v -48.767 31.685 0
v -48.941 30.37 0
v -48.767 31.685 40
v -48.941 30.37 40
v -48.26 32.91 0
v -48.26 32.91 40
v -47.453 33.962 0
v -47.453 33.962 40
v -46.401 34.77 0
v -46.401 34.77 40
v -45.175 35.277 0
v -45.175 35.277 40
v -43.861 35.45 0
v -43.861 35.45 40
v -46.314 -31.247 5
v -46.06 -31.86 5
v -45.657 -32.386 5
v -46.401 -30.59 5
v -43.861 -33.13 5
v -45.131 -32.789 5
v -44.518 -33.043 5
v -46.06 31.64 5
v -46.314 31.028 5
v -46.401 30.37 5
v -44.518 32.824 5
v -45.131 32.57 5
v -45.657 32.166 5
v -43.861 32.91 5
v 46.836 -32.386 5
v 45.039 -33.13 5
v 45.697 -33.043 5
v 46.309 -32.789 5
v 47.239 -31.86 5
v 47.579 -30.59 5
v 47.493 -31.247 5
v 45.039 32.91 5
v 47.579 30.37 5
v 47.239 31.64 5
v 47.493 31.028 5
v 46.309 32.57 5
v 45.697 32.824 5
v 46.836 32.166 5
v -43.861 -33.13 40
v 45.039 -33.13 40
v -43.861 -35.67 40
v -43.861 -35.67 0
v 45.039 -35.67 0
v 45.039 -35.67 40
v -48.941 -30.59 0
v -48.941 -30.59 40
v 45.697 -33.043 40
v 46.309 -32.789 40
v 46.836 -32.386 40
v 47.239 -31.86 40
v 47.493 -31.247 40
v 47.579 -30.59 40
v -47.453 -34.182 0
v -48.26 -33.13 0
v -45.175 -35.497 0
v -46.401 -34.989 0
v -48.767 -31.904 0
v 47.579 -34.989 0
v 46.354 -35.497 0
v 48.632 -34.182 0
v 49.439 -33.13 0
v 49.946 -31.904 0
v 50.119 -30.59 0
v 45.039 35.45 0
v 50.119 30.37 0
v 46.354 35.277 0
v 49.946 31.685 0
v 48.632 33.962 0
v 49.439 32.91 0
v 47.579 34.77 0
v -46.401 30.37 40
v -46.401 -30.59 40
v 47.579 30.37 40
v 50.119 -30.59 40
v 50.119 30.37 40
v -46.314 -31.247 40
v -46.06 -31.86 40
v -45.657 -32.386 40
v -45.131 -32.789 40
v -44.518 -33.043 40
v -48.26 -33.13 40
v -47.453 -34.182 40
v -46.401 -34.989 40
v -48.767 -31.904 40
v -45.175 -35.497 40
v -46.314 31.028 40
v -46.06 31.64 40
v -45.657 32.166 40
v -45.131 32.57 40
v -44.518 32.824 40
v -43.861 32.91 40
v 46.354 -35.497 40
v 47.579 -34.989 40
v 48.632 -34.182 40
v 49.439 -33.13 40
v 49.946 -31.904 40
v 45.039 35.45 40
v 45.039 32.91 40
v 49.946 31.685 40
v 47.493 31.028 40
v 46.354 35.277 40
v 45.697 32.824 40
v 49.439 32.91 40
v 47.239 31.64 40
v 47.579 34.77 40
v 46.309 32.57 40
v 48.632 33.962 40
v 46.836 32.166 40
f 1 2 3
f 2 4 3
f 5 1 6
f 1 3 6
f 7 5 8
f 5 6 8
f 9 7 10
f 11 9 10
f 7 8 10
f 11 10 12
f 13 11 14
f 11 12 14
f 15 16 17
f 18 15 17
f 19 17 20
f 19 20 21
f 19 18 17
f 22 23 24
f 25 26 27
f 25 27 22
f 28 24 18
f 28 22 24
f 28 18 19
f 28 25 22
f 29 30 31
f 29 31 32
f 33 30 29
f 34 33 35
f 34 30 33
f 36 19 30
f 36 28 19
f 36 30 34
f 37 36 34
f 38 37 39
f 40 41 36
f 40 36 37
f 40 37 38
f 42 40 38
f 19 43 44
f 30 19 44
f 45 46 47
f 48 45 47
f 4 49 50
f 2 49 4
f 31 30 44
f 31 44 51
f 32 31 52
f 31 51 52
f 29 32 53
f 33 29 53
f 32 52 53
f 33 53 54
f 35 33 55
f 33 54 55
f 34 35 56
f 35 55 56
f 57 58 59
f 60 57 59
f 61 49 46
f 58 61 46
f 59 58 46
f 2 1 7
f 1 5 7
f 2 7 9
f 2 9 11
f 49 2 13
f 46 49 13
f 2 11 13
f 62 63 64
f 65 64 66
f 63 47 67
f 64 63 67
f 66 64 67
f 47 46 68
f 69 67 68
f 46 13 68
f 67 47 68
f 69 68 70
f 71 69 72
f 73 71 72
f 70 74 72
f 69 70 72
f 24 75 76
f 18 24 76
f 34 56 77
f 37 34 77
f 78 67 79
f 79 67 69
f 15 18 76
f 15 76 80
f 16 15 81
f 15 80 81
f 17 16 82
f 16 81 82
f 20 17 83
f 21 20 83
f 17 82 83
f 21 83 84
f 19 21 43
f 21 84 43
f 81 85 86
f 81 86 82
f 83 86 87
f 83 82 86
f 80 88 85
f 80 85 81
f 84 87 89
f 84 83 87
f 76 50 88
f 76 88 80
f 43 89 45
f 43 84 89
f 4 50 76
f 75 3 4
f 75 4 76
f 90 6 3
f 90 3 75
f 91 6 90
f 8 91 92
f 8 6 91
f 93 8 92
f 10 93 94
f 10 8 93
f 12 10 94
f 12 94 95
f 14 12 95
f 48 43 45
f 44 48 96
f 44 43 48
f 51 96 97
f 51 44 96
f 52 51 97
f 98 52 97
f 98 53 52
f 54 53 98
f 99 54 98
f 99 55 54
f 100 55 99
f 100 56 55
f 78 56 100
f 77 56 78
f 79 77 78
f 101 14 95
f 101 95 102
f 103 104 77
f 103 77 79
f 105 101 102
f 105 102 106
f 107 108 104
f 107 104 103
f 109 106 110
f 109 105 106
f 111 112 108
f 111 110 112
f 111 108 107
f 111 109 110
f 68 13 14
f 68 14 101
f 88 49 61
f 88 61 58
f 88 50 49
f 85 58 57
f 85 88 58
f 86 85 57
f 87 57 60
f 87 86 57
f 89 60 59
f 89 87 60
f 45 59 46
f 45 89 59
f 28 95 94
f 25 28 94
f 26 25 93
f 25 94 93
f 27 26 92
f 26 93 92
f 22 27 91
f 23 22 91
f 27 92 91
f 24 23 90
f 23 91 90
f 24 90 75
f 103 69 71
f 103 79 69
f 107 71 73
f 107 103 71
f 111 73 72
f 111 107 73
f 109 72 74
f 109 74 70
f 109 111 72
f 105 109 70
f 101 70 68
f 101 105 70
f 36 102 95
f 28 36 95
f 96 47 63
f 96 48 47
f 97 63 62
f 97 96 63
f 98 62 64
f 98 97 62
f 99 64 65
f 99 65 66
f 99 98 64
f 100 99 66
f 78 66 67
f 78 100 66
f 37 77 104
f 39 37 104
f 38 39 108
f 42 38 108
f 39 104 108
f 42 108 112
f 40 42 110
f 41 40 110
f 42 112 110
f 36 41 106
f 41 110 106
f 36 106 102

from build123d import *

# Parameters (mm, degrees)
SKETCH1_W           = 99.06
SKETCH1_H           = 71.12
BOSS_EXTRUDE1_DEPTH = 40
FILLET1_R           = 5.08
CUT_EXTRUDE2_DEPTH  = 35


with BuildPart() as part:
    # Sketch1 → Boss-Extrude1 (new body)
    with BuildSketch(Plane.XY):
        with Locations((0.589485294, -0.109632353)):
            Rectangle(SKETCH1_W, SKETCH1_H)
    extrude(amount=BOSS_EXTRUDE1_DEPTH)

    # Fillet1
    fillet1_edges = [part.edges().sort_by_distance(p)[0] for p in [
        (-48.940514706, 35.450367647, 20),
        (50.119485294, 35.450367647, 20),
        (50.119485294, -35.669632353, 20),
        (-48.940514706, -35.669632353, 20),
    ]]
    fillet(fillet1_edges, radius=FILLET1_R)

    # Sketch2 → Cut-Extrude2 (cut)
    with BuildSketch(Plane.XY.offset(40)):
        with BuildLine():
            Line((47.579485294, -30.589632353), (47.579485294, 30.370367647))
            ThreePointArc((47.579485294, 30.370367647), (46.835536518, 32.166418871), (45.039485294, 32.910367647))
            Line((45.039485294, 32.910367647), (-43.860514706, 32.910367647))
            ThreePointArc((-43.860514706, 32.910367647), (-45.65656593, 32.166418871), (-46.400514706, 30.370367647))
            Line((-46.400514706, 30.370367647), (-46.400514706, -30.589632353))
            ThreePointArc((-46.400514706, -30.589632353), (-45.65656593, -32.385683577), (-43.860514706, -33.129632353))
            Line((-43.860514706, -33.129632353), (45.039485294, -33.129632353))
            ThreePointArc((45.039485294, -33.129632353), (46.835536518, -32.385683577), (47.579485294, -30.589632353))
        make_face()
    extrude(amount=-CUT_EXTRUDE2_DEPTH, mode=Mode.SUBTRACT)


solid = part.part
